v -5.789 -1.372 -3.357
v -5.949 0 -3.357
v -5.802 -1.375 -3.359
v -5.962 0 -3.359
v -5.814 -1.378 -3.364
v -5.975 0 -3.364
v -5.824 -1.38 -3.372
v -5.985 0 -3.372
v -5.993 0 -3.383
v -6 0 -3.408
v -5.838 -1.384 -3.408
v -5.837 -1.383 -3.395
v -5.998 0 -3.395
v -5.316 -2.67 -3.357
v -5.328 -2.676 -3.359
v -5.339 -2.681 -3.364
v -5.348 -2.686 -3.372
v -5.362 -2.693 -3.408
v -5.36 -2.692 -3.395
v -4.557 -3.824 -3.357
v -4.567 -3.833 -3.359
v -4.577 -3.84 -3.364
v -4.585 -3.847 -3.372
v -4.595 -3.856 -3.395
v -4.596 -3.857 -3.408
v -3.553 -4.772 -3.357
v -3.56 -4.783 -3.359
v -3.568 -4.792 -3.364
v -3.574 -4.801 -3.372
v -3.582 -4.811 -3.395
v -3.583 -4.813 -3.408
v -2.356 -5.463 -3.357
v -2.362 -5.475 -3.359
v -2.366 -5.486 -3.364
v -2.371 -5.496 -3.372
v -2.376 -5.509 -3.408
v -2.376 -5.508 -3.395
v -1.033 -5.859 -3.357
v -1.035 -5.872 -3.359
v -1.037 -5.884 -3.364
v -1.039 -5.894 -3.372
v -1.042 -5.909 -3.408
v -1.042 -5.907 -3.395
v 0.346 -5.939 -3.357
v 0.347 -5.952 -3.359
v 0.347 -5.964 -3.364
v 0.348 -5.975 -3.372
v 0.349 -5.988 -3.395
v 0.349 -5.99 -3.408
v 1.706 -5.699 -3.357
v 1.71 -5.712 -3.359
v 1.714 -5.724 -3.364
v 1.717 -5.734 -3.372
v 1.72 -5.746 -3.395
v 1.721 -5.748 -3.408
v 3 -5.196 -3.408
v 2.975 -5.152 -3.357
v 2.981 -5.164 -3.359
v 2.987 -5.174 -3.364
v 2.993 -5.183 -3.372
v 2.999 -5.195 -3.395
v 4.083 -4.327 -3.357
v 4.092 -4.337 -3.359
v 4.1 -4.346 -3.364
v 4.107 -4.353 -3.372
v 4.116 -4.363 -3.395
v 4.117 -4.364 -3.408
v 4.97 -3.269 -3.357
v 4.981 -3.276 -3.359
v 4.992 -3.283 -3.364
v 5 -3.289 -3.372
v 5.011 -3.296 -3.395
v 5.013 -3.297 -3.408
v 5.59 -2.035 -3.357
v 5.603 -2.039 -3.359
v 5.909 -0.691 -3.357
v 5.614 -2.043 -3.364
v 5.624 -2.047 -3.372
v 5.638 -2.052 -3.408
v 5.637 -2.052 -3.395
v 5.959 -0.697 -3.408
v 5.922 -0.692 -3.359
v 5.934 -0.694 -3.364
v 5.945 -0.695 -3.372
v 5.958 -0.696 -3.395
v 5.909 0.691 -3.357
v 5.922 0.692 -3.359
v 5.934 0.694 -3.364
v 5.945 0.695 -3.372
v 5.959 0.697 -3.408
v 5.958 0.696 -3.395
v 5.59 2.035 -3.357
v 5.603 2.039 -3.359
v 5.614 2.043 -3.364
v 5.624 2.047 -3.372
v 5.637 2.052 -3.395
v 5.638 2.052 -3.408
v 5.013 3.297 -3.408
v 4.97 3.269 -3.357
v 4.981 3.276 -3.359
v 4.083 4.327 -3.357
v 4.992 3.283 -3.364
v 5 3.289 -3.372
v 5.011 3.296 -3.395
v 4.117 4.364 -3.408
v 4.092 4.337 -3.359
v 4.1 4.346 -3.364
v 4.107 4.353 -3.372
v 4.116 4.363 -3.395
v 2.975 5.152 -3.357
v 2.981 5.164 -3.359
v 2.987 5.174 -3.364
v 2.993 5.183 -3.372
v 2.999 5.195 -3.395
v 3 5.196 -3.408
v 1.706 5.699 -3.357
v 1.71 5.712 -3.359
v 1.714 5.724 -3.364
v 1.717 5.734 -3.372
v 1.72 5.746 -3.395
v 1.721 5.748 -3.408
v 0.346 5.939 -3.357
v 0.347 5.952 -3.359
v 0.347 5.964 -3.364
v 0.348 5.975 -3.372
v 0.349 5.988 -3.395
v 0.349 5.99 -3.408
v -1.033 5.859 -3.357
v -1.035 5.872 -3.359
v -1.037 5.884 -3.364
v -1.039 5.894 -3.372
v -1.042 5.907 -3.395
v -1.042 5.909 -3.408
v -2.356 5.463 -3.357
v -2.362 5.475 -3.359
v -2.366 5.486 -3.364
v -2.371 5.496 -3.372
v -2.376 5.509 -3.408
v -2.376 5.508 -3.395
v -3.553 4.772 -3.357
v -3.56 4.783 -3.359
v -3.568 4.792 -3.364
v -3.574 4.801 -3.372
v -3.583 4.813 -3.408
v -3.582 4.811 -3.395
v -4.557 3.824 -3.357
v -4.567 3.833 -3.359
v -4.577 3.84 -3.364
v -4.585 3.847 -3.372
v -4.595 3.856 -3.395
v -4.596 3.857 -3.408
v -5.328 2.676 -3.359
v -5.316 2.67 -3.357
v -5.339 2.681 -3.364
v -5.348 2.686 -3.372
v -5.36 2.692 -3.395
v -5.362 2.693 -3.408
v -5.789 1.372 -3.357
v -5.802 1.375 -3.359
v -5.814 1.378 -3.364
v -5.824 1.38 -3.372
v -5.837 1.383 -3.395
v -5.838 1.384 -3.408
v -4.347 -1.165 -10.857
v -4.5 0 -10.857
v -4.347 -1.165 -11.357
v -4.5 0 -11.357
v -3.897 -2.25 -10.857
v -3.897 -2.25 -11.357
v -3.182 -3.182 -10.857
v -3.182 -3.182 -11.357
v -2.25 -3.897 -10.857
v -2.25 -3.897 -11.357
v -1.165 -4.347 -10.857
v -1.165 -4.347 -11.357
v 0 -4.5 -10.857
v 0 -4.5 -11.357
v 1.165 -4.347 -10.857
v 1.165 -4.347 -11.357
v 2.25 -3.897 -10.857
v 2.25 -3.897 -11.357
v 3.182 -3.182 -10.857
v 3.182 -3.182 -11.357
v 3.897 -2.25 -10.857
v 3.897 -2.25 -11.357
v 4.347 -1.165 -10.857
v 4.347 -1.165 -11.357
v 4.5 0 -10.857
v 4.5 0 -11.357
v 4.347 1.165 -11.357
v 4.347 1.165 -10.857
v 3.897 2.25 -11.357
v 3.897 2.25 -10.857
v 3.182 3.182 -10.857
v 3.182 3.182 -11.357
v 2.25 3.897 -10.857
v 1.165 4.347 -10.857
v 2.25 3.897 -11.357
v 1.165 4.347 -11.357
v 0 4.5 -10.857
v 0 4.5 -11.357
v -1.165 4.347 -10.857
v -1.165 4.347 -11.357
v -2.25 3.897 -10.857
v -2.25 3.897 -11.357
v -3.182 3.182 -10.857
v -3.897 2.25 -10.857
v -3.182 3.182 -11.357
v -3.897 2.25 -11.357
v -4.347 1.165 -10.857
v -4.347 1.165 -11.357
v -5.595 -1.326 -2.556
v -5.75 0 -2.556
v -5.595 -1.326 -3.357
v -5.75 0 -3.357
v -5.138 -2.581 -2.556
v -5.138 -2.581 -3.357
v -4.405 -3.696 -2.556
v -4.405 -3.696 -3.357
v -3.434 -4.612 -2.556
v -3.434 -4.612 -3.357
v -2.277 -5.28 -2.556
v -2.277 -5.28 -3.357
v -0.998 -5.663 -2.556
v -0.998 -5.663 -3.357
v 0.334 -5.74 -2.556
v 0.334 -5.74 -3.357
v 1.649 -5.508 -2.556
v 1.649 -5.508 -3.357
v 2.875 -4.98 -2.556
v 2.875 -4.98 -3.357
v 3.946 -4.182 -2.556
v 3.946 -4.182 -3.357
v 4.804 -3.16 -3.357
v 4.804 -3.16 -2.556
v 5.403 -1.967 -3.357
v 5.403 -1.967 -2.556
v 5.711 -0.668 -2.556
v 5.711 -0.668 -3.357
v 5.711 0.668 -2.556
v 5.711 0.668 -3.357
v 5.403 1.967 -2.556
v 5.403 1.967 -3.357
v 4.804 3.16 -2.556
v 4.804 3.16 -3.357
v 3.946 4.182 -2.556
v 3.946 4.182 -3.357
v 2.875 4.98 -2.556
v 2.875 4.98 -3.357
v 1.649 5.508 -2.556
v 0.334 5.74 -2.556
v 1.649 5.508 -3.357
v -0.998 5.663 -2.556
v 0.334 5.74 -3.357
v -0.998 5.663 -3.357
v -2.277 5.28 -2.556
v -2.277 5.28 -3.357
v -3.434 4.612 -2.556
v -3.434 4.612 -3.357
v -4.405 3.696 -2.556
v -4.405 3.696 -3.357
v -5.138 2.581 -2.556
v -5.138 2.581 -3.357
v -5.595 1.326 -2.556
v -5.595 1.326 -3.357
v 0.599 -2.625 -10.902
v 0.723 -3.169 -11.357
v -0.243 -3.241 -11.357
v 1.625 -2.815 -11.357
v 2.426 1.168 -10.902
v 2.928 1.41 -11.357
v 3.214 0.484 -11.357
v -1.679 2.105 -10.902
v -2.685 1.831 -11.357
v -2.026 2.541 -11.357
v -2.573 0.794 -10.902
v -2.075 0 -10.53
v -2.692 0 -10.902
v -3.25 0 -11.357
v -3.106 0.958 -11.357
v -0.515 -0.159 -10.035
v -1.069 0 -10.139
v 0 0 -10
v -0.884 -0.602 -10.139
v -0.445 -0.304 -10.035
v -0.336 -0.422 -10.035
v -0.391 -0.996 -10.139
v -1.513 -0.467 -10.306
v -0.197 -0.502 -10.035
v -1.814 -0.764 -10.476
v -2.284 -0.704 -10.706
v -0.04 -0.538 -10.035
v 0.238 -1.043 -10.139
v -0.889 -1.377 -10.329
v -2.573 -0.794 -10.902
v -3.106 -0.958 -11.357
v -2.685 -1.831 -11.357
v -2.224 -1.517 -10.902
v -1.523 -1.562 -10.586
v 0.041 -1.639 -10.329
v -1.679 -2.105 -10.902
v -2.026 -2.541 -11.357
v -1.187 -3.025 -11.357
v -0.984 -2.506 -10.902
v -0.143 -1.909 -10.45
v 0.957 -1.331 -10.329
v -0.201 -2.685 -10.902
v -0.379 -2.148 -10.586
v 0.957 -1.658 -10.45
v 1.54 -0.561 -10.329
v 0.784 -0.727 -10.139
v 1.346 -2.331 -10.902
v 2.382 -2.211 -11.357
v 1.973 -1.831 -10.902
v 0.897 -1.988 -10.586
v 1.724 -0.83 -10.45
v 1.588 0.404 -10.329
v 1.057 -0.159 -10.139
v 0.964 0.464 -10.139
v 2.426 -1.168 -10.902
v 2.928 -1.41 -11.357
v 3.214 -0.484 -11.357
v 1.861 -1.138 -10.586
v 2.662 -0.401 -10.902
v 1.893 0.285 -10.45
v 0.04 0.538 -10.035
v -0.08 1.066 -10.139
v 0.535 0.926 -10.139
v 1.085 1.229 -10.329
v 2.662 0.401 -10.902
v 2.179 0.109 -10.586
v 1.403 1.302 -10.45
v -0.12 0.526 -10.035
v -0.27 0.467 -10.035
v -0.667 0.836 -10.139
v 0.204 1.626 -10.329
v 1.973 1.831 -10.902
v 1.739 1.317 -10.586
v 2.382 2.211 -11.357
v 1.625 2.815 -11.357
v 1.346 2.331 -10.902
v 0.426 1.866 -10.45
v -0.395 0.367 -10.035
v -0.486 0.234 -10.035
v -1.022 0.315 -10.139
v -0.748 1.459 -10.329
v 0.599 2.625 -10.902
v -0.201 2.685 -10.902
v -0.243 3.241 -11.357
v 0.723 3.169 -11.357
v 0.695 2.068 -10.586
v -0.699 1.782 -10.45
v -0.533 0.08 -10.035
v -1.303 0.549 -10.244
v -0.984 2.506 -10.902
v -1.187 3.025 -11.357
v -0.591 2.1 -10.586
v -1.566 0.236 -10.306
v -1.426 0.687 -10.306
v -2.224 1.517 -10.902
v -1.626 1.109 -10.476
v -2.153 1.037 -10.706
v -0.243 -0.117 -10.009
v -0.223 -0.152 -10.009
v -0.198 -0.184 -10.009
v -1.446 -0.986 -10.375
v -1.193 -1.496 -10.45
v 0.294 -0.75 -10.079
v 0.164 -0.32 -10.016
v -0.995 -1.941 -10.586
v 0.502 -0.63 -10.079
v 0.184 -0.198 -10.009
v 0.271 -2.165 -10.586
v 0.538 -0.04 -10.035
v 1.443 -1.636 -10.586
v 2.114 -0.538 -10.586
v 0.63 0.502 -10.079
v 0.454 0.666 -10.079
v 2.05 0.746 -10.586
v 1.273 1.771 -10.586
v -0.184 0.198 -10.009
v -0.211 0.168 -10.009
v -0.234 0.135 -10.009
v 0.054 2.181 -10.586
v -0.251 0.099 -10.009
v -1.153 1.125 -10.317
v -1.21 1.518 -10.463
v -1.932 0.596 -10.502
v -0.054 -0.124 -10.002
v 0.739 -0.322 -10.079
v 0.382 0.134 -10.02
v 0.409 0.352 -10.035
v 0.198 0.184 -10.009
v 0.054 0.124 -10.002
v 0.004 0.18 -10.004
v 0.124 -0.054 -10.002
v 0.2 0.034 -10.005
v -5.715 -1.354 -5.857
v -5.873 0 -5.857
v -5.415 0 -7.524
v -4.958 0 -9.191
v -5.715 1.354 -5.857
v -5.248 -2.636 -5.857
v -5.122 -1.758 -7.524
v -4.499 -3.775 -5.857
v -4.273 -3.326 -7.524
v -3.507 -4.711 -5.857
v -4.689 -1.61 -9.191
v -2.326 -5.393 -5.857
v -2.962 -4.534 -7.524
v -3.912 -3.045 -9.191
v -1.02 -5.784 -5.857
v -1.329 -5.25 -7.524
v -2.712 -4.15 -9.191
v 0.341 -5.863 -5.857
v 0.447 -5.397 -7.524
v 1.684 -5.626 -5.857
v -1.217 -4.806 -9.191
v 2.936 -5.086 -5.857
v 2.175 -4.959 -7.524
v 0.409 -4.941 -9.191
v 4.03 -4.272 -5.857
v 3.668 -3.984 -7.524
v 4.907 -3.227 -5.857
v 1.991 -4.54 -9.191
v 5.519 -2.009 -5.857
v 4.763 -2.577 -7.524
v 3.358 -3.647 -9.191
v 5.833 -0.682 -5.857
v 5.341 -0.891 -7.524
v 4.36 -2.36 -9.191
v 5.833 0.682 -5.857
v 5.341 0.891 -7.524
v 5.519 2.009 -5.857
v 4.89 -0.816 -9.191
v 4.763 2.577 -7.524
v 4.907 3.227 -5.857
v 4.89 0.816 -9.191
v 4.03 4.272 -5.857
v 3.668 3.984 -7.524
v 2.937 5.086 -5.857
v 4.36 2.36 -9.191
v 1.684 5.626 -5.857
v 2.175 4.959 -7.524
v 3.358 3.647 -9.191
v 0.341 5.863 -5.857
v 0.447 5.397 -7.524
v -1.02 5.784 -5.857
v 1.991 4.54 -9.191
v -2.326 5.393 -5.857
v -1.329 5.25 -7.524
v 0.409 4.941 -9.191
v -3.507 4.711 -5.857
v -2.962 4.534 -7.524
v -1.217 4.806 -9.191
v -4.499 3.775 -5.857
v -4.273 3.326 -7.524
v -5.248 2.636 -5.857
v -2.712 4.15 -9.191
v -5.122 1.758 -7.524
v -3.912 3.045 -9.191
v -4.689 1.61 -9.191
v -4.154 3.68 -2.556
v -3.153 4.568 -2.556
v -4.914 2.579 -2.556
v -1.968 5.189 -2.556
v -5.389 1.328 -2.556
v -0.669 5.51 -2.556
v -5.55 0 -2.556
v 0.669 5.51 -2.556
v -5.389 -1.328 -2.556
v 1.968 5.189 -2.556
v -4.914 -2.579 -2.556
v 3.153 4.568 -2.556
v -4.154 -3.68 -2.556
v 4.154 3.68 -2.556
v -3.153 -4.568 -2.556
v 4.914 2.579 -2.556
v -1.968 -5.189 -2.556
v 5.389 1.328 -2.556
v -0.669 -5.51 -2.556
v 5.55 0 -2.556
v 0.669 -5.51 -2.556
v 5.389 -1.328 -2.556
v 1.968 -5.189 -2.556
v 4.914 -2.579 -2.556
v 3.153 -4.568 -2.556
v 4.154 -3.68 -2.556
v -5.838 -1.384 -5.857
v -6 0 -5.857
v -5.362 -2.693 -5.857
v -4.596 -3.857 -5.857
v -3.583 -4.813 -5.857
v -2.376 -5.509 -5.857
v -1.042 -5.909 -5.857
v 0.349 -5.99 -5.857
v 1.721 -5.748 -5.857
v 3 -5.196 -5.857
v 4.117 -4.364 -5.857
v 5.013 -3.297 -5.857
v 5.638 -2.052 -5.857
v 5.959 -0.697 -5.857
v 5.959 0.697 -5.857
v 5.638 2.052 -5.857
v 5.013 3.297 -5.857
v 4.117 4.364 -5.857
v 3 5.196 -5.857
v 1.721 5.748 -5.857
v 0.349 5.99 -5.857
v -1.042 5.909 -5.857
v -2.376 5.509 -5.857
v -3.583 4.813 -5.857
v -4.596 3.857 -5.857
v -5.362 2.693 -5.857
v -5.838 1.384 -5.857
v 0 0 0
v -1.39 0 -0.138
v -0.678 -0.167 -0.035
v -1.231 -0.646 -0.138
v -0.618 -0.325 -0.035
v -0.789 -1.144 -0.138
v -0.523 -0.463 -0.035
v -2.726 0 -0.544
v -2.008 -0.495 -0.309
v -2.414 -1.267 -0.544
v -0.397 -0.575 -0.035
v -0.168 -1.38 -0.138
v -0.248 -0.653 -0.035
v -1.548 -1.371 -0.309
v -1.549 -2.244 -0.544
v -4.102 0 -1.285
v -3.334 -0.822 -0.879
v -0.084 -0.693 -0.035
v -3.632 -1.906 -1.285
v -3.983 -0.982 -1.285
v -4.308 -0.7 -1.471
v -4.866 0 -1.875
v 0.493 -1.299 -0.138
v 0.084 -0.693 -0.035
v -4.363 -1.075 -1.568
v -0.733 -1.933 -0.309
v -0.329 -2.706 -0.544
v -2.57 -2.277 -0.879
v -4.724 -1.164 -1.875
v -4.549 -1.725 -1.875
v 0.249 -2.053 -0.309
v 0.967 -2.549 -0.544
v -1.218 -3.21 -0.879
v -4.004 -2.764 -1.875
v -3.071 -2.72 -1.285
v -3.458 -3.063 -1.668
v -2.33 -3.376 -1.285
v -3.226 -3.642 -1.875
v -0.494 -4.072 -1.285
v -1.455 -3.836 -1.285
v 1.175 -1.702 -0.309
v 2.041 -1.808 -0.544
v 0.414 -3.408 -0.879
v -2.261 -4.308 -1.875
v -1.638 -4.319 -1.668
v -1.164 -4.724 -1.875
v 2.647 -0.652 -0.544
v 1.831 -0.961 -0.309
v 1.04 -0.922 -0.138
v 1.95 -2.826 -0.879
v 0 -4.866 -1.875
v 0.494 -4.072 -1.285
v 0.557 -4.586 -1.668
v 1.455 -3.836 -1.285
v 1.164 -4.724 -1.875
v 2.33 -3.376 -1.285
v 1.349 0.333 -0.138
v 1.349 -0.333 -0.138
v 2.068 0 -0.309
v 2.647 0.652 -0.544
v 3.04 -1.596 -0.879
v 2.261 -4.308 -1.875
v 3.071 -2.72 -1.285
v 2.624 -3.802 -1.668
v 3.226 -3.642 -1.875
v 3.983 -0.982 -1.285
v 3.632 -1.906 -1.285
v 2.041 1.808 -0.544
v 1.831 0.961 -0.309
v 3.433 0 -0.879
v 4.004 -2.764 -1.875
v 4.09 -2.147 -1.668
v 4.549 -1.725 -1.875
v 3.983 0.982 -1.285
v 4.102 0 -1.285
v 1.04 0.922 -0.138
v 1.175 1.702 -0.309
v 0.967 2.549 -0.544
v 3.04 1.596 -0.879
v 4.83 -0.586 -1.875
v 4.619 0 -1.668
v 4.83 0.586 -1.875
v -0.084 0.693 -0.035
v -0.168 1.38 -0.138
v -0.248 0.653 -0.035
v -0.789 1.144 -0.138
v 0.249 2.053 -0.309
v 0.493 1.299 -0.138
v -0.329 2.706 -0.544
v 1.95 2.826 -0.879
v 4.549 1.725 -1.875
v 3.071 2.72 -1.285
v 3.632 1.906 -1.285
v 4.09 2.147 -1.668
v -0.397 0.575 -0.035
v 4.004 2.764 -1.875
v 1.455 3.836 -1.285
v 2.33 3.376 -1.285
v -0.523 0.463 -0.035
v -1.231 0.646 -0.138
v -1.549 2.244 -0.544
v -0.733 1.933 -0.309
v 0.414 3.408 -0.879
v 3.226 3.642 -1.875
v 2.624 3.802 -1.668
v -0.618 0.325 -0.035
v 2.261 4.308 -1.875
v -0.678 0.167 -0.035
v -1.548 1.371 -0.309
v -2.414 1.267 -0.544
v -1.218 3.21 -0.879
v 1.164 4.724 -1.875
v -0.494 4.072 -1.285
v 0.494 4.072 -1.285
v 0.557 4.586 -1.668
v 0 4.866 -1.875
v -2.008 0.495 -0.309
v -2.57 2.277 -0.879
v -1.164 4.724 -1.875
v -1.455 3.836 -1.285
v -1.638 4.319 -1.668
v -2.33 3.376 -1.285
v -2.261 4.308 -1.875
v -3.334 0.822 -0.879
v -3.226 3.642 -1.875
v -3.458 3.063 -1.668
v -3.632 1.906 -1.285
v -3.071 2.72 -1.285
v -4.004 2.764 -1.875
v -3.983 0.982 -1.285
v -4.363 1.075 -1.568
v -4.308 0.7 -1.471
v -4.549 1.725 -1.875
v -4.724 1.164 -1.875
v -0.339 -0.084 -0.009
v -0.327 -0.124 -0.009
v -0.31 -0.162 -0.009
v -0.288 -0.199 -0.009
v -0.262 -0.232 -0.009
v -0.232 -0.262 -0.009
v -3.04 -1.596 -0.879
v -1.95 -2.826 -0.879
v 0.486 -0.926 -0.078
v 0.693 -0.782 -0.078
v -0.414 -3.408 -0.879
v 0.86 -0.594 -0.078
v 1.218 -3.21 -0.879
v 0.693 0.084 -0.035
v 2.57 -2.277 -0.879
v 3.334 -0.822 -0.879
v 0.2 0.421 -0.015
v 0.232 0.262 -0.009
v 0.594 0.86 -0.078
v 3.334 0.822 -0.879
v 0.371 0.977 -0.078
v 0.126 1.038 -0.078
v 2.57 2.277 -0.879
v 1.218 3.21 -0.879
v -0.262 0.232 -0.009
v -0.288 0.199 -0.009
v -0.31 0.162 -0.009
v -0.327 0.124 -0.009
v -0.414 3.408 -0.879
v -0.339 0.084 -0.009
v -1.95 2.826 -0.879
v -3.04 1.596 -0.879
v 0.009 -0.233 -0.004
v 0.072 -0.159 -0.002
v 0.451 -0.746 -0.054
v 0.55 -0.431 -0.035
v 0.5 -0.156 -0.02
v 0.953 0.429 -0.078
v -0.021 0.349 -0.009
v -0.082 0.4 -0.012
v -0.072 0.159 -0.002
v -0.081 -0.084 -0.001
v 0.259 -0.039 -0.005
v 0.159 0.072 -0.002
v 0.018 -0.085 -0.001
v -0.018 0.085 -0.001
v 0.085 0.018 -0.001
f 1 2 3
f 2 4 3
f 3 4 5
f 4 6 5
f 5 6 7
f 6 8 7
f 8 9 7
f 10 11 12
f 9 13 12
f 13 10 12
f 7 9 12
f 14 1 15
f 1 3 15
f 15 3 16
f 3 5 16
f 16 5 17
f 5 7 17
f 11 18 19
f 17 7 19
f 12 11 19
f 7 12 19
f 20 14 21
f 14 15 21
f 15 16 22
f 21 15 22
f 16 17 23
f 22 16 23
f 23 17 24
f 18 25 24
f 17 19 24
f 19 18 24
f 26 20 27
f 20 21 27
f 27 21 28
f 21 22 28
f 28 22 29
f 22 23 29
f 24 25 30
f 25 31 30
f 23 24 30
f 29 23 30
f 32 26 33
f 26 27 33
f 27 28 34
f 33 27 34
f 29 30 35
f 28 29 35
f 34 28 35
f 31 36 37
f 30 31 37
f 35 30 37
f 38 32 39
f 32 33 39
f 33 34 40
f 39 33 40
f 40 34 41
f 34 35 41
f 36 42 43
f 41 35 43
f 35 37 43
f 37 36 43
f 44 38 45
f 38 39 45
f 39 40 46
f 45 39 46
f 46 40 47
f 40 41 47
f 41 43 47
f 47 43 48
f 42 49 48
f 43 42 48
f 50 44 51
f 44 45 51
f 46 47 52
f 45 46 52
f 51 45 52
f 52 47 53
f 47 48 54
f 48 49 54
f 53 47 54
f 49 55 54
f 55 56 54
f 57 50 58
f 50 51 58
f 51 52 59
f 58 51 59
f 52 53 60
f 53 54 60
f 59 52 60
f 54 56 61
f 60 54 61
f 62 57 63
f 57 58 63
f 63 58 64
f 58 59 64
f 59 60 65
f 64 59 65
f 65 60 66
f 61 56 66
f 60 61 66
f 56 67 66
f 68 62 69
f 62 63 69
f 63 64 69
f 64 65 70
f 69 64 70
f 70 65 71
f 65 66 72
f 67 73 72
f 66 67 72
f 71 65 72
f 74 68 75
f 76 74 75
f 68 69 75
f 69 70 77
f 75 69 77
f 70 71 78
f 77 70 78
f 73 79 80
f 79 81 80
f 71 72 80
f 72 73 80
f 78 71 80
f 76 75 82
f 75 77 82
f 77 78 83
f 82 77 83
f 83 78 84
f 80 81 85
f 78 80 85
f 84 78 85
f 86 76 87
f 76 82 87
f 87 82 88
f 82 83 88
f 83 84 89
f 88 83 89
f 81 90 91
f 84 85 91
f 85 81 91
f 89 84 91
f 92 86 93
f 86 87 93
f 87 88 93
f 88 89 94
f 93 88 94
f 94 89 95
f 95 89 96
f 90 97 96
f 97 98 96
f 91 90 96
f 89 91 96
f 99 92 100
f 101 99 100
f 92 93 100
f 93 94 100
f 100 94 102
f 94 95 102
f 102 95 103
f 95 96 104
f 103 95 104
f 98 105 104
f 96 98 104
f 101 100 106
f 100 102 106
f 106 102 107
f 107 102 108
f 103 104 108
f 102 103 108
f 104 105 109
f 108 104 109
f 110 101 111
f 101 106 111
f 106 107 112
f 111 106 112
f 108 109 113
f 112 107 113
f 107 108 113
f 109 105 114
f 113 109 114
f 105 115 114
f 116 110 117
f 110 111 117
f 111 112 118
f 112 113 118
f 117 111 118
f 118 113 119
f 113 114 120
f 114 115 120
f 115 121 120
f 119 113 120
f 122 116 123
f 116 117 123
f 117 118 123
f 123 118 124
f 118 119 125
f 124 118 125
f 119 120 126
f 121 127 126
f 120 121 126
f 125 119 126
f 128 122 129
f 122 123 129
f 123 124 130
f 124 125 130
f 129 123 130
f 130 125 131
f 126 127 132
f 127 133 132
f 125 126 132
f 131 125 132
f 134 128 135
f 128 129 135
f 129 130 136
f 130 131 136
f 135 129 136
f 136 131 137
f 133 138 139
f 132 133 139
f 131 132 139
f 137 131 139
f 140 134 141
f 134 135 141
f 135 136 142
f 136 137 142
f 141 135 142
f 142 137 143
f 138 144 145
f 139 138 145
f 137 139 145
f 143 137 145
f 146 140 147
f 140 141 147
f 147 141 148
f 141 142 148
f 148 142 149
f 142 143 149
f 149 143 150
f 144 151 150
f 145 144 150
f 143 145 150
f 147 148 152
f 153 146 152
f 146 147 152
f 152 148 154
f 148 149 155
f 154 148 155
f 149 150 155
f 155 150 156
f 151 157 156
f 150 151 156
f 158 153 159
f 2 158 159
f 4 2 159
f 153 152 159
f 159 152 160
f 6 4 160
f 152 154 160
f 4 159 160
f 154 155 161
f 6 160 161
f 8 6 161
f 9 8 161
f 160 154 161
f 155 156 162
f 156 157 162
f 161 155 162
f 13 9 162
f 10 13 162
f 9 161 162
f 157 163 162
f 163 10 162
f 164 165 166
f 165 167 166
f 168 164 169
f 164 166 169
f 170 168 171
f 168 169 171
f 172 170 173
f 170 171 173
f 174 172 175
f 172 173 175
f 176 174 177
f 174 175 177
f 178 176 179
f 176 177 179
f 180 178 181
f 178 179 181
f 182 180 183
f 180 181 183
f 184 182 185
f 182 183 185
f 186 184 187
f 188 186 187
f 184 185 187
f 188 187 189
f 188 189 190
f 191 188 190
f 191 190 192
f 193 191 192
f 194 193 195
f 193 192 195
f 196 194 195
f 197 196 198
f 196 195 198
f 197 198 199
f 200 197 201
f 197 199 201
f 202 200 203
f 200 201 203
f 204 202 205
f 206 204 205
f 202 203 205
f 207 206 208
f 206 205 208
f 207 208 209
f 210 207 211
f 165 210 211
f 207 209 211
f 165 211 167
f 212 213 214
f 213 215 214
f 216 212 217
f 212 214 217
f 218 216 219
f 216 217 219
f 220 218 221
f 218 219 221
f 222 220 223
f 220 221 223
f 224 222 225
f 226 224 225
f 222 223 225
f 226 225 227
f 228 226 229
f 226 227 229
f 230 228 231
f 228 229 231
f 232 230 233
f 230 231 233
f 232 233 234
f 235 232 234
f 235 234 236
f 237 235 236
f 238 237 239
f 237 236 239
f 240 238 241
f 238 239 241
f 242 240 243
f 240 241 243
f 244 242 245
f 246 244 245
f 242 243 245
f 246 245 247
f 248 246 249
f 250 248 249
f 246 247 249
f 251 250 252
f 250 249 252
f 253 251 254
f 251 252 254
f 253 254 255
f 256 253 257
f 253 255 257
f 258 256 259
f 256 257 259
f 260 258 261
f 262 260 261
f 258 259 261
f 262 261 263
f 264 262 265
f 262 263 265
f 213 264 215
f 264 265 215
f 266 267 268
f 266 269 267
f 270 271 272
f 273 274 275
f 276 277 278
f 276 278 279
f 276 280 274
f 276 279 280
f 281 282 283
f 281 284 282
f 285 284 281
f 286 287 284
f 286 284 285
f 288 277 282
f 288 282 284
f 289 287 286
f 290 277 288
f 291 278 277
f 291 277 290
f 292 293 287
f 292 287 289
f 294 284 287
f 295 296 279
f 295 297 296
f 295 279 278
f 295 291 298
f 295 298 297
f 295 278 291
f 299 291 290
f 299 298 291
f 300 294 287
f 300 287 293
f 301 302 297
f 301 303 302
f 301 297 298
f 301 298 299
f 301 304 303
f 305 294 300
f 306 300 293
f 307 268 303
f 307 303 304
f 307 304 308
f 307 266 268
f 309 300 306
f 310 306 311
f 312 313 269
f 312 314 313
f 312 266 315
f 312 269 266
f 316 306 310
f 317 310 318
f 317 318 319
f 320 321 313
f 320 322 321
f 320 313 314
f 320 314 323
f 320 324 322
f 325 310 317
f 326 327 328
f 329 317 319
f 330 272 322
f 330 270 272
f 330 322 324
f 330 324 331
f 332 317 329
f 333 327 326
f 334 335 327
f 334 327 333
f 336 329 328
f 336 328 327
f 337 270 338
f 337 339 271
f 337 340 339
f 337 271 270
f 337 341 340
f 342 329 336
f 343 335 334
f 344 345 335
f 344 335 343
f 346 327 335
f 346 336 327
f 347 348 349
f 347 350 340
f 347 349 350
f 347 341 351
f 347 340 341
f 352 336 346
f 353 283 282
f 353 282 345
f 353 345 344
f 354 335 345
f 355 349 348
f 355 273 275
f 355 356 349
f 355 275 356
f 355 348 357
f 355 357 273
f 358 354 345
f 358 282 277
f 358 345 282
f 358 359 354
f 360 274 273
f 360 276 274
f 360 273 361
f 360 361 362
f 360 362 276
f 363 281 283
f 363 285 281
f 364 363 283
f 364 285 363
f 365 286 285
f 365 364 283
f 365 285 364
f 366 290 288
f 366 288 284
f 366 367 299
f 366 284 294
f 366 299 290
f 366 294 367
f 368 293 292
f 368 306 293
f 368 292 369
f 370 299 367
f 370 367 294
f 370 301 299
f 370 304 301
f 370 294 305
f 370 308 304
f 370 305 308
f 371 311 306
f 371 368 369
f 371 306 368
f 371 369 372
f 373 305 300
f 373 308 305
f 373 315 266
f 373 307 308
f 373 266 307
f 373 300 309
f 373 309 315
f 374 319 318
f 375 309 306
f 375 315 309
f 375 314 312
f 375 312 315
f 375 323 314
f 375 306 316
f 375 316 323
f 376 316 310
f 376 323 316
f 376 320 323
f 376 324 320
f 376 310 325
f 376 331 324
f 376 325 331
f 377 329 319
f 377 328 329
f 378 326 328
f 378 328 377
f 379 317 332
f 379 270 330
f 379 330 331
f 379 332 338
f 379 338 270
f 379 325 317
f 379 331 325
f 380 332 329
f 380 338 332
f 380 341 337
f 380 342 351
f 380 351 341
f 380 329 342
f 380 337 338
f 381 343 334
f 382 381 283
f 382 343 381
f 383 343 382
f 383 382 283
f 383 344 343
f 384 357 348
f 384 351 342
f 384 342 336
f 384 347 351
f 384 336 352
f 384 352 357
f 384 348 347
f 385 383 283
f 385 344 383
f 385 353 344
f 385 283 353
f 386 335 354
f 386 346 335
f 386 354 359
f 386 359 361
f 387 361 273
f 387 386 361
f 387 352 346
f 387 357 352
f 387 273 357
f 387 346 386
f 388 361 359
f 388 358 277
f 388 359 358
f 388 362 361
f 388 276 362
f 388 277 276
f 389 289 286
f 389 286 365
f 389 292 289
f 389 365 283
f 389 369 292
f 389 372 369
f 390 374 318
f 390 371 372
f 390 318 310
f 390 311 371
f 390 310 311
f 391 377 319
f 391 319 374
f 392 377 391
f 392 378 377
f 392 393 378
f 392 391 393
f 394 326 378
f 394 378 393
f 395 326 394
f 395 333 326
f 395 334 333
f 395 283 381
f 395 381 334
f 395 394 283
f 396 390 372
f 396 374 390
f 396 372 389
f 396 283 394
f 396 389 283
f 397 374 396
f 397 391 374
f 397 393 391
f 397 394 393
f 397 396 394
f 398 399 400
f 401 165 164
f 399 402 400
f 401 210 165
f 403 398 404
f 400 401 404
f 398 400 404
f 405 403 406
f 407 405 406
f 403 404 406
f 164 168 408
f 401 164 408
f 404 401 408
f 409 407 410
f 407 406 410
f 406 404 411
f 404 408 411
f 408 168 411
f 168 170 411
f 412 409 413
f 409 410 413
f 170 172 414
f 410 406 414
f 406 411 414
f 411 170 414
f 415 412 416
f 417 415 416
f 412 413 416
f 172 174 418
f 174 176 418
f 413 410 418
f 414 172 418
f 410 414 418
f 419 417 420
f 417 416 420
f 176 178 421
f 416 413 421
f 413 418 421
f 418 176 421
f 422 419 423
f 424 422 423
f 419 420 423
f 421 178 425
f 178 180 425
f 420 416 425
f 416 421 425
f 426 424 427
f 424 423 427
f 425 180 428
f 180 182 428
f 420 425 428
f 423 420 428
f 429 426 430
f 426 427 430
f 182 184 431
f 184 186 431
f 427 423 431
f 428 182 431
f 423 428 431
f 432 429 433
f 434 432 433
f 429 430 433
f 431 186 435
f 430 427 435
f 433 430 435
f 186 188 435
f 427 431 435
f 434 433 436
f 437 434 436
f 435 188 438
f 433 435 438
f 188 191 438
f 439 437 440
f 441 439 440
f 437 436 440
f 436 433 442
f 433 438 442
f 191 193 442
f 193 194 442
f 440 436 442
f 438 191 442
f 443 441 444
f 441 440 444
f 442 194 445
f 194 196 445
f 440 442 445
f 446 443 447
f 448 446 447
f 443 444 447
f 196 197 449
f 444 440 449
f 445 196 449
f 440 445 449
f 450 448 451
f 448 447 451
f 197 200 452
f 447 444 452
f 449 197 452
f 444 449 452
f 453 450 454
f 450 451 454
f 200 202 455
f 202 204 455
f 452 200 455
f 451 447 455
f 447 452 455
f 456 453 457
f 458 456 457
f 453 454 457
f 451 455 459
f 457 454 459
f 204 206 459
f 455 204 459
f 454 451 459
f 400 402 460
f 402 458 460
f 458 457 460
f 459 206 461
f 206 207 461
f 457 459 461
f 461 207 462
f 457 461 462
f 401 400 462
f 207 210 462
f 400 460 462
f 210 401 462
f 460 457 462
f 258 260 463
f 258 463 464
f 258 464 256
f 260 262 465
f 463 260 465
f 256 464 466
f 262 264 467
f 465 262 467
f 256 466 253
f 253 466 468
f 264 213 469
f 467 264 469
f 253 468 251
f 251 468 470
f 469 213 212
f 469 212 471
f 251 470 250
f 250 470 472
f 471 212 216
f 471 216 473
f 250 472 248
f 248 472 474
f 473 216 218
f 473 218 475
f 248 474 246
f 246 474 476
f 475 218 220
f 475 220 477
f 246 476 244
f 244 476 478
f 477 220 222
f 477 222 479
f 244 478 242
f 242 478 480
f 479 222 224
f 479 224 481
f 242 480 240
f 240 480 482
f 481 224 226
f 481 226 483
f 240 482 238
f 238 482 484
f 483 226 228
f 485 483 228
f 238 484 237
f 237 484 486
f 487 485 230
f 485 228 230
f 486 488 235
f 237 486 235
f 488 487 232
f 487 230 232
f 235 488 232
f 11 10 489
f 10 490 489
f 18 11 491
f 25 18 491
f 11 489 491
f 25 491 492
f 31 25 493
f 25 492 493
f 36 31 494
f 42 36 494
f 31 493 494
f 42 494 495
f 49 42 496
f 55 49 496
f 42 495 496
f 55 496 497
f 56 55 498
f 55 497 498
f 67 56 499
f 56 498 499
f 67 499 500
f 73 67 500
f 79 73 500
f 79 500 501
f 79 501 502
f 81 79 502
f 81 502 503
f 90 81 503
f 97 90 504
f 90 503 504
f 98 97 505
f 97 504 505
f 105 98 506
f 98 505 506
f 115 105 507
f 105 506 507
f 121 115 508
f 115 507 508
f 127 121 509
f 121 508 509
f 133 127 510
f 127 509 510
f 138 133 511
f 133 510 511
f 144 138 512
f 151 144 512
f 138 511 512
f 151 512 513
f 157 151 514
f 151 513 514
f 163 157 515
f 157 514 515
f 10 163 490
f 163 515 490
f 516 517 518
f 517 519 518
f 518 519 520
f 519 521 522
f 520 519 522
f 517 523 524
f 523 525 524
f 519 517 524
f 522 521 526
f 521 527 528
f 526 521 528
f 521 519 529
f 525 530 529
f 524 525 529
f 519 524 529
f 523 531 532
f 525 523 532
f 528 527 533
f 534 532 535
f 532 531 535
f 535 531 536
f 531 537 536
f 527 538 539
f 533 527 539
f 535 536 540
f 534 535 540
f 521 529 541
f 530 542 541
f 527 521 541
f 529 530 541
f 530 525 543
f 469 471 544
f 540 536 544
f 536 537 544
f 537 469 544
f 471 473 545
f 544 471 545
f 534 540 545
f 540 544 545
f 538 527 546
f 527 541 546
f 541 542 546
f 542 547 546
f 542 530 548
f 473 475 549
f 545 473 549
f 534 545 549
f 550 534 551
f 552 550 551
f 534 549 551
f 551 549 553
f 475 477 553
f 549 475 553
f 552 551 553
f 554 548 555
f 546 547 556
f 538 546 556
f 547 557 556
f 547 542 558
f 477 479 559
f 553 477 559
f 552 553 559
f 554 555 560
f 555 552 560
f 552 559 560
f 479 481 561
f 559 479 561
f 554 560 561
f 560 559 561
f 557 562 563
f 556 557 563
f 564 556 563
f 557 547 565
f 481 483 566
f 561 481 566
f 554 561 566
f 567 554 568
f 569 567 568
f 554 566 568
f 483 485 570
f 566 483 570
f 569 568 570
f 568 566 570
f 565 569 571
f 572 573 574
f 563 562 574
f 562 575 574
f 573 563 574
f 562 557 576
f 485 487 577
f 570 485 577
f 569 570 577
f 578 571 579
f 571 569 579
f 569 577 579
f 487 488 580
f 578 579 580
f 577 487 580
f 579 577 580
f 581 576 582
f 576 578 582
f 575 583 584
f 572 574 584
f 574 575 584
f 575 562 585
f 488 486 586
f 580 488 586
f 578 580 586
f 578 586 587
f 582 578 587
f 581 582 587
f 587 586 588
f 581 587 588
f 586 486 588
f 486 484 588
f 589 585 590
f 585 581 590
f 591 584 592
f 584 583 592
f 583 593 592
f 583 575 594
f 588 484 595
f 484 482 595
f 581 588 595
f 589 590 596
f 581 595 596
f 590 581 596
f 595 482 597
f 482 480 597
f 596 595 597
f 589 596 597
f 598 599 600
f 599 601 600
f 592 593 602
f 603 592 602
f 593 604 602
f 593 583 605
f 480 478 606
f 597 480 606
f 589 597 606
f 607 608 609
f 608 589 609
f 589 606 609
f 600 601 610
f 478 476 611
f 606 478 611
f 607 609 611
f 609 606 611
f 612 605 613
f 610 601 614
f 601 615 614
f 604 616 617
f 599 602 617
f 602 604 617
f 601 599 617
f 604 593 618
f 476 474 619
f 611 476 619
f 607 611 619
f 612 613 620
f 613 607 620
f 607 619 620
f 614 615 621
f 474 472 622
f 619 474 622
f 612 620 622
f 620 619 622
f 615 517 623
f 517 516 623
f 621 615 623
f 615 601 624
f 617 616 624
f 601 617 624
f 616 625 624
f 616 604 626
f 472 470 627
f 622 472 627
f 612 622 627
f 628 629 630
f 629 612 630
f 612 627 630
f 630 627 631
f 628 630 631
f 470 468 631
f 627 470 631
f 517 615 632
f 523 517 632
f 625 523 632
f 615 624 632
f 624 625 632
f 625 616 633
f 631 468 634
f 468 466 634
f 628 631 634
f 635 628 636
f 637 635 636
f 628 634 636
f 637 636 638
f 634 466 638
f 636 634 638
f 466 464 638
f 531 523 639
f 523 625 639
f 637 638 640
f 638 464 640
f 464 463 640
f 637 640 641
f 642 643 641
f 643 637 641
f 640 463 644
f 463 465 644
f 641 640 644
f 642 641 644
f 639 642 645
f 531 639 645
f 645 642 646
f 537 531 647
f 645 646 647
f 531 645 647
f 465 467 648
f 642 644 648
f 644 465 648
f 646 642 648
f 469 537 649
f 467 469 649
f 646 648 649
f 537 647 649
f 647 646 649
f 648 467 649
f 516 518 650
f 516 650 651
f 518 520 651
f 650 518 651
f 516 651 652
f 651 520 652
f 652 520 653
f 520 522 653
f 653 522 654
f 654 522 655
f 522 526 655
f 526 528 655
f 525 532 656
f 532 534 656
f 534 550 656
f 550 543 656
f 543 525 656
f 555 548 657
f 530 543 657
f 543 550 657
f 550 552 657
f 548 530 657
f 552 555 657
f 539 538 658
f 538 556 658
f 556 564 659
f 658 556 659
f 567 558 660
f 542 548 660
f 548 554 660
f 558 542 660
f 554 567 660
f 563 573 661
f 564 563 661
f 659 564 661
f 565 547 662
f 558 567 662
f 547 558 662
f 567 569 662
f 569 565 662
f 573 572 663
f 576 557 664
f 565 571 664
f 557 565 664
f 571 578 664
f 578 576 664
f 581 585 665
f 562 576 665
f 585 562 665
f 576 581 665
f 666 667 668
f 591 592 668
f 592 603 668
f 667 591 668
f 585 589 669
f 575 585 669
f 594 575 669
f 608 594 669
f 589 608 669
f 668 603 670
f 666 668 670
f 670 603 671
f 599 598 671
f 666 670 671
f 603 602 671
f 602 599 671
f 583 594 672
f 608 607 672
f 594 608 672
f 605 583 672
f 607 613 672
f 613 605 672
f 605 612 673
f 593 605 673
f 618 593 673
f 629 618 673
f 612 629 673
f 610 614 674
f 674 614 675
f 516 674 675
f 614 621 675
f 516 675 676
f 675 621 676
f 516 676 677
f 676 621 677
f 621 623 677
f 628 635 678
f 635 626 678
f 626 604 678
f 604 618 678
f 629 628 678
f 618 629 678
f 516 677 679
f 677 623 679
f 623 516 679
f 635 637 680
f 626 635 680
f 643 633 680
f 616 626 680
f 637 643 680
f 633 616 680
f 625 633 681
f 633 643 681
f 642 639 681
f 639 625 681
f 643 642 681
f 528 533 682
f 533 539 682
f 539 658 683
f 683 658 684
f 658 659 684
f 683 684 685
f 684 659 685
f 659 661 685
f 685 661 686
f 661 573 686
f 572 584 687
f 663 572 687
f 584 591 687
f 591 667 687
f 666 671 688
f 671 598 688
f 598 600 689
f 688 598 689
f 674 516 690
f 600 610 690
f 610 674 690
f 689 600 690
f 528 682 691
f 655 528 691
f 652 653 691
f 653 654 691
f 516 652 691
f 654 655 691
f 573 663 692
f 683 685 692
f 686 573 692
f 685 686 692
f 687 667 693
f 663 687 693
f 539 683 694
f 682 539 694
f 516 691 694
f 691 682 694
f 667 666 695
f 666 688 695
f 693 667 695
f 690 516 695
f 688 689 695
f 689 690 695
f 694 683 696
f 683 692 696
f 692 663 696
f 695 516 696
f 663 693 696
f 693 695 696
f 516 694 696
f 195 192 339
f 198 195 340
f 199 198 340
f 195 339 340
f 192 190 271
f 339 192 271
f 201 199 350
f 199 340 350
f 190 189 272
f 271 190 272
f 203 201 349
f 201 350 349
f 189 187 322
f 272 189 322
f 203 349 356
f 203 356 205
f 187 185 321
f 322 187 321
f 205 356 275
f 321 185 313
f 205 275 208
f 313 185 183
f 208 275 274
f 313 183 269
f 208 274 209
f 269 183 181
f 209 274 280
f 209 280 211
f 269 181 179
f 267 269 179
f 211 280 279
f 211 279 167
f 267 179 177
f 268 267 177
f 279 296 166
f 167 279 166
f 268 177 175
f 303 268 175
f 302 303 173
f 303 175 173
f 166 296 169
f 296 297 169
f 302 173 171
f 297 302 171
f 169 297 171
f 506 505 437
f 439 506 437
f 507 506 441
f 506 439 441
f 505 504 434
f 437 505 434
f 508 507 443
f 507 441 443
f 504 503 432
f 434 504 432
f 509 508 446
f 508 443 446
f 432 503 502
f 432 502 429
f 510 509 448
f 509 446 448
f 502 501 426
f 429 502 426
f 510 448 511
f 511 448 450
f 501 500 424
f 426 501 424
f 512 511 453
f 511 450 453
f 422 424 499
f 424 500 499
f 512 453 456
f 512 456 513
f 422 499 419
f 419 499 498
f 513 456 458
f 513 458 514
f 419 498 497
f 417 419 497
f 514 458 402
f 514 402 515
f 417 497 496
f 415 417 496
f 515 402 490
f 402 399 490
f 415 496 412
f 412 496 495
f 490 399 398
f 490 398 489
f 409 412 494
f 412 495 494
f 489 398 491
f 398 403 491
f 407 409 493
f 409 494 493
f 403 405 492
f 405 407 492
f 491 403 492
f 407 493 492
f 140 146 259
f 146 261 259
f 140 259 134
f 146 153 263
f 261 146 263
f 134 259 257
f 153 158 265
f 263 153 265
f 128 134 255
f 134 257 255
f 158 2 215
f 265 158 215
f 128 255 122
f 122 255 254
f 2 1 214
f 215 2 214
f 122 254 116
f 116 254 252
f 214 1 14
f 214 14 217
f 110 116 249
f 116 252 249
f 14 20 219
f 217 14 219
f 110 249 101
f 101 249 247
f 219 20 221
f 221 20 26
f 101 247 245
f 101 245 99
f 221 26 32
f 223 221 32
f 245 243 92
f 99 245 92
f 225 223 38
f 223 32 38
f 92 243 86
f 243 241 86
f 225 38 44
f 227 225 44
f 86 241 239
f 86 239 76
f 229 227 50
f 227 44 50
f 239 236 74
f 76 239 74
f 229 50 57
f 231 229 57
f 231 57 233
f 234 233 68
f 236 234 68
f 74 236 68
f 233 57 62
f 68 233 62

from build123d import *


with BuildPart() as part:
    # Sketch1 → Revolve1 (revolve)
    with BuildSketch(Plane(origin=(0, 0, 0), x_dir=(0, 0, -1), z_dir=(1, 0, 0)), mode=Mode.PRIVATE) as revolve1_sk:
        with BuildLine():
            Line((10, 0), (0, 0))
            add(Edge.make_bspline(
                [(0, 0), (3.5599e-05, 0.016666801), (0.000106798, 0.050001231), (0.000652865, 0.100002577), (0.001541965, 0.1500037), (0.00277976, 0.200005118), (0.00437987, 0.250006415), (0.006342127, 0.300007464), (0.008653546, 0.350008586), (0.011306301, 0.400010647), (0.014344795, 0.450011021), (0.017718859, 0.500012898), (0.021465187, 0.550013422), (0.025546859, 0.600015942), (0.030015342, 0.650015894), (0.03482081, 0.70001787), (0.039992041, 0.750019052), (0.045523257, 0.800020171), (0.051408883, 0.850022422), (0.057677216, 0.900021809), (0.064279583, 0.95002496), (0.071264406, 1.000025161), (0.078604568, 1.05002637), (0.086301292, 1.100028717), (0.094377045, 1.150028529), (0.102799423, 1.20003228), (0.111617788, 1.250030975), (0.120783561, 1.300033624), (0.130325404, 1.350034612), (0.140235292, 1.400035949), (0.150516909, 1.450036918), (0.161163804, 1.500039649), (0.17219876, 1.550039155), (0.183594648, 1.600042195), (0.195380444, 1.65004137), (0.207524249, 1.700045854), (0.220069218, 1.750045189), (0.232988482, 1.800046718), (0.246290189, 1.850047612), (0.259968354, 1.900050402), (0.274039825, 1.950051408), (0.288500418, 2.000052634), (0.303351068, 2.050053844), (0.318592454, 2.100054806), (0.334221213, 2.150057651), (0.350251722, 2.200058963), (0.366685967, 2.250057862), (0.383501889, 2.300062903), (0.40073359, 2.350063852), (0.418376737, 2.400063011), (0.436415737, 2.45006601), (0.454864866, 2.500069094), (0.473738026, 2.550068164), (0.493019727, 2.600068939), (0.512706128, 2.650074525), (0.532830884, 2.700072839), (0.553370049, 2.750076061), (0.574338539, 2.800079744), (0.595755257, 2.85007556), (0.61758101, 2.900081863), (0.639854553, 2.950081918), (0.66256348, 3.000085551), (0.685725632, 3.050086231), (0.7093363, 3.100087577), (0.733399151, 3.150087825), (0.757906071, 3.20009433), (0.782892021, 3.250091412), (0.808327595, 3.300098823), (0.834255389, 3.350093071), (0.860630848, 3.400102473), (0.88750378, 3.450102818), (0.914867347, 3.500100816), (0.942705478, 3.550107403), (0.971049019, 3.600107299), (0.999888878, 3.65011121), (1.029241659, 3.70011152), (1.059102526, 3.750114933), (1.089483632, 3.800118313), (1.120396235, 3.850118736), (1.151837467, 3.900122094), (1.183818601, 3.950125628), (1.216352043, 4.000125498), (1.249431788, 4.050132262), (1.283085623, 4.100131924), (1.317306062, 4.150136161), (1.352110512, 4.200135309), (1.387489417, 4.25014553), (1.423484922, 4.300141599), (1.460075424, 4.350148495), (1.497288074, 4.40015156), (1.53513209, 4.450151014), (1.57360284, 4.500160743), (1.612737012, 4.550160216), (1.652530339, 4.600162877), (1.692991663, 4.65017277), (1.734157348, 4.700168226), (1.776008892, 4.750178192), (1.81858317, 4.800180487), (1.861887951, 4.850182262), (1.905930073, 4.900195432), (1.95075691, 4.950189638), (1.996348781, 5.000203486), (2.042755705, 5.050200606), (2.089969588, 5.100213134), (2.13803612, 5.150217143), (2.186971133, 5.200222711), (2.236797623, 5.250226935), (2.287534309, 5.300237945), (2.339222476, 5.350244315), (2.391888284, 5.400253552), (2.445574222, 5.45025529), (2.500276259, 5.500295659), (2.537351737, 5.533372099), (2.55599, 5.55)],
                knots=[0, 0, 0, 0, 0.007942908, 0.015886211, 0.023830326, 0.031775625, 0.039722547, 0.047671504, 0.055622833, 0.063576922, 0.07153435, 0.079495335, 0.087460381, 0.095429767, 0.10340416, 0.111383685, 0.11936889, 0.127360179, 0.135357957, 0.143362824, 0.151374788, 0.159394667, 0.167422653, 0.175459144, 0.183504791, 0.191559748, 0.199624961, 0.207700294, 0.215786437, 0.223883802, 0.231992798, 0.240113836, 0.248247664, 0.256394356, 0.264554679, 0.272728682, 0.280917534, 0.289121281, 0.297340338, 0.305575119, 0.313826467, 0.322094811, 0.330380581, 0.338684203, 0.347006099, 0.355347174, 0.363707867, 0.372088108, 0.380489342, 0.388912021, 0.397356053, 0.405822412, 0.414312099, 0.422825001, 0.431361552, 0.439923369, 0.448510316, 0.457123451, 0.46576386, 0.474430749, 0.483125841, 0.491849606, 0.500603176, 0.50938703, 0.518201646, 0.527047492, 0.535926456, 0.544838318, 0.553785016, 0.56276558, 0.57178273, 0.580836987, 0.589928093, 0.599058103, 0.608227539, 0.617437722, 0.626689183, 0.635983268, 0.645321349, 0.654703976, 0.664132545, 0.673608478, 0.683132339, 0.69270646, 0.702331431, 0.712008739, 0.721738974, 0.731525502, 0.741368016, 0.751269015, 0.761230086, 0.77125187, 0.781337931, 0.791488944, 0.801706572, 0.811994513, 0.822352464, 0.832784196, 0.843291476, 0.853876085, 0.864542998, 0.875291944, 0.886128003, 0.897051998, 0.908069131, 0.919182484, 0.930395179, 0.941710372, 0.953133539, 0.9646691, 0.976321538, 0.988096569, 1, 1, 1, 1], degree=3))
            Line((2.55599, 5.55), (2.55599, 5.75))
            Line((2.55599, 5.75), (3.35748, 5.75))
            Line((3.35748, 5.75), (3.35748, 5.9492))
            ThreePointArc((3.35748, 5.9492), (3.372358976, 5.985121024), (3.40828, 6))
            Line((3.40828, 6), (5.85748, 6))
            Line((5.85748, 6), (5.85748, 5.873))
            Line((5.85748, 5.873), (10.85748, 4.5))
            Line((10.85748, 4.5), (11.35748, 4.5))
            Line((11.35748, 4.5), (11.35748, 3.25))
            add(Edge.make_bspline(
                [(10, 0), (10.000056861, 0.01666708), (10.000170592, 0.0500037), (10.001117916, 0.100007258), (10.002618837, 0.150010821), (10.004729124, 0.20001471), (10.007448952, 0.250018414), (10.010781755, 0.300021674), (10.014713511, 0.350025055), (10.019237073, 0.400029972), (10.024395369, 0.45003214), (10.030142728, 0.500036366), (10.0365002, 0.55004091), (10.043488845, 0.600042391), (10.051062088, 0.650048046), (10.059267779, 0.700050298), (10.068078377, 0.750053759), (10.077497714, 0.800058165), (10.087538544, 0.850061737), (10.098204423, 0.90006334), (10.10946822, 0.950069931), (10.121378341, 1.000069573), (10.1338821, 1.050076401), (10.147029343, 1.100077299), (10.160786514, 1.150082617), (10.175182904, 1.20008343), (10.190190402, 1.250088766), (10.205837242, 1.300089137), (10.222093378, 1.350096132), (10.238998481, 1.400096962), (10.256533003, 1.450097633), (10.27468071, 1.500104385), (10.29347393, 1.550106807), (10.312907874, 1.600107471), (10.332970002, 1.650110027), (10.353661774, 1.700114087), (10.374991067, 1.750119393), (10.396980392, 1.800115743), (10.419583602, 1.85012682), (10.442866046, 1.900119802), (10.46675986, 1.950130895), (10.491328563, 2.000128462), (10.516535034, 2.050137081), (10.542424605, 2.10013211), (10.568950372, 2.150143092), (10.596168084, 2.200140634), (10.624047647, 2.250148072), (10.652620792, 2.300151866), (10.681894818, 2.350153147), (10.711867243, 2.400159359), (10.742558203, 2.450168863), (10.774003866, 2.500169352), (10.806196749, 2.550175824), (10.839159562, 2.600187098), (10.872932785, 2.650196408), (10.907550175, 2.700198383), (10.943011873, 2.750216489), (10.979389434, 2.800226376), (11.016714764, 2.850240931), (11.055043535, 2.900253576), (11.094420826, 2.950276147), (11.134932562, 3.000293776), (11.176645078, 3.05032018), (11.219656781, 3.10034969), (11.264089006, 3.150364301), (11.309969614, 3.200456536), (11.341555497, 3.23339405), (11.35748, 3.25)],
                knots=[0, 0, 0, 0, 0.013871316, 0.027744679, 0.04162207, 0.055505482, 0.069397057, 0.083298853, 0.0972127, 0.11114058, 0.125085031, 0.139047518, 0.15303035, 0.167035925, 0.181065482, 0.195121849, 0.209206593, 0.223321686, 0.237469634, 0.251652447, 0.265871509, 0.28013002, 0.294428661, 0.308770726, 0.323157469, 0.337591571, 0.352074187, 0.366608018, 0.381194123, 0.395836109, 0.410534992, 0.425291675, 0.44010988, 0.454991472, 0.469937257, 0.484948997, 0.500029516, 0.5151817, 0.53040506, 0.545704772, 0.561079045, 0.576533165, 0.59206763, 0.607686658, 0.623389394, 0.639181429, 0.65506315, 0.671038969, 0.687112017, 0.703284041, 0.719559658, 0.735945077, 0.752442192, 0.769055912, 0.785794359, 0.802664341, 0.819669638, 0.836822213, 0.85413113, 0.871607402, 0.88926238, 0.907112993, 0.925174996, 0.943470086, 0.962020759, 0.980852187, 1, 1, 1, 1], degree=3))
        make_face()
    revolve(revolve1_sk.sketch.rotate(Axis((0, 0, -11.886951368), (0, 0, 1)), 90), axis=Axis((0, 0, -11.886951368), (0, 0, 1)))


solid = part.part
